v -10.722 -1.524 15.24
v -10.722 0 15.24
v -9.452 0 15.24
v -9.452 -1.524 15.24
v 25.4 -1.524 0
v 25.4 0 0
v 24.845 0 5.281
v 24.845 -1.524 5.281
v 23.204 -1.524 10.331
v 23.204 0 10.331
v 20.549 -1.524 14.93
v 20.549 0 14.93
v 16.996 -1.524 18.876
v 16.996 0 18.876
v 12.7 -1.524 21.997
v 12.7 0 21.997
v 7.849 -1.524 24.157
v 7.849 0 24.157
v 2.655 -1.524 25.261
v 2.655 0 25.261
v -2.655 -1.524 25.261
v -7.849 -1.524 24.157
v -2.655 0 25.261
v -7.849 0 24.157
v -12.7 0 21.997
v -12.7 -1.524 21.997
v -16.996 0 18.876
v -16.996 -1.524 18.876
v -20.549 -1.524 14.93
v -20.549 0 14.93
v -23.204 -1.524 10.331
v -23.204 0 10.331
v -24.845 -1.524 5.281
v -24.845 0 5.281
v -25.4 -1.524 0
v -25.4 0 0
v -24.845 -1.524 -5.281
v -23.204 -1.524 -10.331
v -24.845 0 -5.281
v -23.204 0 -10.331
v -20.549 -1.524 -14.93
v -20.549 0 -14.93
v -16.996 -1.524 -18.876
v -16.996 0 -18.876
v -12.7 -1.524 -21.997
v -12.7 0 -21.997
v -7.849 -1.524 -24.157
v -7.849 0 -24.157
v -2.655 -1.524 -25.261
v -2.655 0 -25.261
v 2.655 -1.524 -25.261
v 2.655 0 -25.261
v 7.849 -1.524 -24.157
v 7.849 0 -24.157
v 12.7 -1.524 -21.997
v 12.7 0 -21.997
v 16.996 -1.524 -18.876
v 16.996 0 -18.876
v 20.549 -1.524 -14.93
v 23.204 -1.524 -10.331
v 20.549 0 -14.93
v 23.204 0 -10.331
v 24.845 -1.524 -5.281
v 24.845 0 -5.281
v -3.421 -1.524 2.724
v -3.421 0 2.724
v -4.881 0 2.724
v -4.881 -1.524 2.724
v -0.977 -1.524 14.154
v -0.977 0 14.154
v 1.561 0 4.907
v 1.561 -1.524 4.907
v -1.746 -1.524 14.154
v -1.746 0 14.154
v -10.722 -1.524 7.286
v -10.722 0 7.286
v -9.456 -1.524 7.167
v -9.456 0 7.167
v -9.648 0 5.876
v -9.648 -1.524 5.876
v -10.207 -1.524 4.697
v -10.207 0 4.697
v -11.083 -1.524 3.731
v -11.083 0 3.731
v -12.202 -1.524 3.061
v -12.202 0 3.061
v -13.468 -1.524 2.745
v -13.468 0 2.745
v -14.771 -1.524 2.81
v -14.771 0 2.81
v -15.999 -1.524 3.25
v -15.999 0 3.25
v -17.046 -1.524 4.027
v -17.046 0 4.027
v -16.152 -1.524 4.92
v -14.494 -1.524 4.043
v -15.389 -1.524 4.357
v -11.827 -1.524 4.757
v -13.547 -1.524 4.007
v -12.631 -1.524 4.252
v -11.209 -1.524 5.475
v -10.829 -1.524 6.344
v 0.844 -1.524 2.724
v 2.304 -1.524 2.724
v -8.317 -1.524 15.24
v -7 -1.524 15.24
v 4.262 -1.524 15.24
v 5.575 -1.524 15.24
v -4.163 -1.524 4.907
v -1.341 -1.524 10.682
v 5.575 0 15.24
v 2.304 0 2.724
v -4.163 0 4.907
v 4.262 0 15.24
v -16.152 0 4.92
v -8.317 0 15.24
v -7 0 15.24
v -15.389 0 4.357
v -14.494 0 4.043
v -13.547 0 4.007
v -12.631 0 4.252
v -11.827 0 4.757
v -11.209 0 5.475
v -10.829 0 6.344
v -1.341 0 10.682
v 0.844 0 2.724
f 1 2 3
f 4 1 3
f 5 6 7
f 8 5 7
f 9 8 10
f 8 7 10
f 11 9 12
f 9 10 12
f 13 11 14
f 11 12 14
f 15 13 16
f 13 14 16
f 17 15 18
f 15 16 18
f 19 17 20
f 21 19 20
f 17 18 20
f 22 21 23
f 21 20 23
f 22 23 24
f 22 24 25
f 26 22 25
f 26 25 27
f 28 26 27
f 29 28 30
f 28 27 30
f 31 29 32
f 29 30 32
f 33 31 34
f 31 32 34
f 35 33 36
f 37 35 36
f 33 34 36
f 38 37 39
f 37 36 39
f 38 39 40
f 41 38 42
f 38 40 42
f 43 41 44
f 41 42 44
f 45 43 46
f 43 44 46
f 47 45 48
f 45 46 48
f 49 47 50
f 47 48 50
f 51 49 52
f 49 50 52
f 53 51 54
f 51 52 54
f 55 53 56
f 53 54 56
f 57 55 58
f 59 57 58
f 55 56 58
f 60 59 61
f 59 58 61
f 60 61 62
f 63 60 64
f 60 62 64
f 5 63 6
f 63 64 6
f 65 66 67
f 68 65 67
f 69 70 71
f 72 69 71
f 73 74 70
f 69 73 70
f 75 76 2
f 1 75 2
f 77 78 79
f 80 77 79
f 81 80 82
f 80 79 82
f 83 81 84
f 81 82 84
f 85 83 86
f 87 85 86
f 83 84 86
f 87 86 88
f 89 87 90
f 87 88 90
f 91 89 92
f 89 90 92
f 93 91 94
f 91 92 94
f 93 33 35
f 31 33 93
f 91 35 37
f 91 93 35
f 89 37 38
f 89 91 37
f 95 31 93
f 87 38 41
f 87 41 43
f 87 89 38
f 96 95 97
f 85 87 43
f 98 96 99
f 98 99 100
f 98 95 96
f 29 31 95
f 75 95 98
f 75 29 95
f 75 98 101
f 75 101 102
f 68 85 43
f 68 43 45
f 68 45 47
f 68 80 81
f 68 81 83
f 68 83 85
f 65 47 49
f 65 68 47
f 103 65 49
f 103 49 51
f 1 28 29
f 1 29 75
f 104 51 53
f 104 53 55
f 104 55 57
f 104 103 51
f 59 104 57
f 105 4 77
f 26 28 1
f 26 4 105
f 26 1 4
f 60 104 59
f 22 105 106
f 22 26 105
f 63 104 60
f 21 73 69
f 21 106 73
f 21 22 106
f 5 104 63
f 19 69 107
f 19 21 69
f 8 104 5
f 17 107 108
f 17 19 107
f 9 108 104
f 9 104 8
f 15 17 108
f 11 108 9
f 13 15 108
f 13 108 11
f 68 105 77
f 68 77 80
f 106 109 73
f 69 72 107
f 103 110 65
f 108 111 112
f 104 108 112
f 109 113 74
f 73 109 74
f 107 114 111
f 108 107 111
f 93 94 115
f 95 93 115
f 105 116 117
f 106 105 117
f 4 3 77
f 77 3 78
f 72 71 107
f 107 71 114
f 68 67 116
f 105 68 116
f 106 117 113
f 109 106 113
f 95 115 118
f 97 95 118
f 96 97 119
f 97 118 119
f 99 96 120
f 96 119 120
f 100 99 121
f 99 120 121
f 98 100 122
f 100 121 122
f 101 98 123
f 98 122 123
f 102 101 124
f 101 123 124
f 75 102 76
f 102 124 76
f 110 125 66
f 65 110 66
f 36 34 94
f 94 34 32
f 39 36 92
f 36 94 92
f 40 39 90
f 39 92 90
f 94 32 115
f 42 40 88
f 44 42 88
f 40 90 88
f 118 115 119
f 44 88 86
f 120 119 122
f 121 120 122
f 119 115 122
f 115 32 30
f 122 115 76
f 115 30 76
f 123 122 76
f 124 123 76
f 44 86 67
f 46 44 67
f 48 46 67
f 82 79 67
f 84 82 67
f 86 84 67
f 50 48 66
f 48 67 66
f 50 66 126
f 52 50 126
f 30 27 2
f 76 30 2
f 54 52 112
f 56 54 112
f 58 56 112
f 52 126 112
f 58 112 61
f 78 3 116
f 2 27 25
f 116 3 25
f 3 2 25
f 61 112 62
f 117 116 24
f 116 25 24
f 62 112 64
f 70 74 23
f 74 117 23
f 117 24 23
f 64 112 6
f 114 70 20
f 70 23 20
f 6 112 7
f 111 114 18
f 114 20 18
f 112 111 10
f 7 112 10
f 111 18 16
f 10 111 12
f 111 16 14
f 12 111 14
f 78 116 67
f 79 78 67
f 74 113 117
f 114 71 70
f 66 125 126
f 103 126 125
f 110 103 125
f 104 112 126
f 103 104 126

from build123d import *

# Parameters (mm, degrees)
F0_R     = 25.4
F1_DEPTH = 1.524


with BuildPart() as f1:
    # F0 (on Front) → F1 (new body)
    with BuildSketch(Plane.XZ):
        Circle(F0_R)
        with BuildLine():
            Line((-10.722334, 7.286357), (-10.722334, 15.24))
            Line((-10.722334, 15.24), (-9.452334, 15.24))
            Line((-9.452334, 15.24), (-9.456435, 7.166546))
            ThreePointArc((-9.456435, 7.166546), (-12.20241, 3.061331), (-17.045993, 4.027183))
            Line((-17.045993, 4.027183), (-16.151985, 4.920356))
            ThreePointArc((-16.151985, 4.920356), (-12.630592, 4.252393), (-10.722334, 7.286357))
        make_face(mode=Mode.SUBTRACT)
        Polygon((-4.88111, 2.723804), (-8.317264, 15.24), (-7.000273, 15.24), (-4.163434, 4.906811), (-1.746424, 14.153804), (-0.977187, 14.153804), (1.561451, 4.906811), (4.262375, 15.24), (5.575043, 15.24), (2.303517, 2.723804), (0.843776, 2.723804), (-1.341137, 10.682351), (-3.421369, 2.723804), align=None, mode=Mode.SUBTRACT)
    extrude(amount=F1_DEPTH)


solid = f1.part
